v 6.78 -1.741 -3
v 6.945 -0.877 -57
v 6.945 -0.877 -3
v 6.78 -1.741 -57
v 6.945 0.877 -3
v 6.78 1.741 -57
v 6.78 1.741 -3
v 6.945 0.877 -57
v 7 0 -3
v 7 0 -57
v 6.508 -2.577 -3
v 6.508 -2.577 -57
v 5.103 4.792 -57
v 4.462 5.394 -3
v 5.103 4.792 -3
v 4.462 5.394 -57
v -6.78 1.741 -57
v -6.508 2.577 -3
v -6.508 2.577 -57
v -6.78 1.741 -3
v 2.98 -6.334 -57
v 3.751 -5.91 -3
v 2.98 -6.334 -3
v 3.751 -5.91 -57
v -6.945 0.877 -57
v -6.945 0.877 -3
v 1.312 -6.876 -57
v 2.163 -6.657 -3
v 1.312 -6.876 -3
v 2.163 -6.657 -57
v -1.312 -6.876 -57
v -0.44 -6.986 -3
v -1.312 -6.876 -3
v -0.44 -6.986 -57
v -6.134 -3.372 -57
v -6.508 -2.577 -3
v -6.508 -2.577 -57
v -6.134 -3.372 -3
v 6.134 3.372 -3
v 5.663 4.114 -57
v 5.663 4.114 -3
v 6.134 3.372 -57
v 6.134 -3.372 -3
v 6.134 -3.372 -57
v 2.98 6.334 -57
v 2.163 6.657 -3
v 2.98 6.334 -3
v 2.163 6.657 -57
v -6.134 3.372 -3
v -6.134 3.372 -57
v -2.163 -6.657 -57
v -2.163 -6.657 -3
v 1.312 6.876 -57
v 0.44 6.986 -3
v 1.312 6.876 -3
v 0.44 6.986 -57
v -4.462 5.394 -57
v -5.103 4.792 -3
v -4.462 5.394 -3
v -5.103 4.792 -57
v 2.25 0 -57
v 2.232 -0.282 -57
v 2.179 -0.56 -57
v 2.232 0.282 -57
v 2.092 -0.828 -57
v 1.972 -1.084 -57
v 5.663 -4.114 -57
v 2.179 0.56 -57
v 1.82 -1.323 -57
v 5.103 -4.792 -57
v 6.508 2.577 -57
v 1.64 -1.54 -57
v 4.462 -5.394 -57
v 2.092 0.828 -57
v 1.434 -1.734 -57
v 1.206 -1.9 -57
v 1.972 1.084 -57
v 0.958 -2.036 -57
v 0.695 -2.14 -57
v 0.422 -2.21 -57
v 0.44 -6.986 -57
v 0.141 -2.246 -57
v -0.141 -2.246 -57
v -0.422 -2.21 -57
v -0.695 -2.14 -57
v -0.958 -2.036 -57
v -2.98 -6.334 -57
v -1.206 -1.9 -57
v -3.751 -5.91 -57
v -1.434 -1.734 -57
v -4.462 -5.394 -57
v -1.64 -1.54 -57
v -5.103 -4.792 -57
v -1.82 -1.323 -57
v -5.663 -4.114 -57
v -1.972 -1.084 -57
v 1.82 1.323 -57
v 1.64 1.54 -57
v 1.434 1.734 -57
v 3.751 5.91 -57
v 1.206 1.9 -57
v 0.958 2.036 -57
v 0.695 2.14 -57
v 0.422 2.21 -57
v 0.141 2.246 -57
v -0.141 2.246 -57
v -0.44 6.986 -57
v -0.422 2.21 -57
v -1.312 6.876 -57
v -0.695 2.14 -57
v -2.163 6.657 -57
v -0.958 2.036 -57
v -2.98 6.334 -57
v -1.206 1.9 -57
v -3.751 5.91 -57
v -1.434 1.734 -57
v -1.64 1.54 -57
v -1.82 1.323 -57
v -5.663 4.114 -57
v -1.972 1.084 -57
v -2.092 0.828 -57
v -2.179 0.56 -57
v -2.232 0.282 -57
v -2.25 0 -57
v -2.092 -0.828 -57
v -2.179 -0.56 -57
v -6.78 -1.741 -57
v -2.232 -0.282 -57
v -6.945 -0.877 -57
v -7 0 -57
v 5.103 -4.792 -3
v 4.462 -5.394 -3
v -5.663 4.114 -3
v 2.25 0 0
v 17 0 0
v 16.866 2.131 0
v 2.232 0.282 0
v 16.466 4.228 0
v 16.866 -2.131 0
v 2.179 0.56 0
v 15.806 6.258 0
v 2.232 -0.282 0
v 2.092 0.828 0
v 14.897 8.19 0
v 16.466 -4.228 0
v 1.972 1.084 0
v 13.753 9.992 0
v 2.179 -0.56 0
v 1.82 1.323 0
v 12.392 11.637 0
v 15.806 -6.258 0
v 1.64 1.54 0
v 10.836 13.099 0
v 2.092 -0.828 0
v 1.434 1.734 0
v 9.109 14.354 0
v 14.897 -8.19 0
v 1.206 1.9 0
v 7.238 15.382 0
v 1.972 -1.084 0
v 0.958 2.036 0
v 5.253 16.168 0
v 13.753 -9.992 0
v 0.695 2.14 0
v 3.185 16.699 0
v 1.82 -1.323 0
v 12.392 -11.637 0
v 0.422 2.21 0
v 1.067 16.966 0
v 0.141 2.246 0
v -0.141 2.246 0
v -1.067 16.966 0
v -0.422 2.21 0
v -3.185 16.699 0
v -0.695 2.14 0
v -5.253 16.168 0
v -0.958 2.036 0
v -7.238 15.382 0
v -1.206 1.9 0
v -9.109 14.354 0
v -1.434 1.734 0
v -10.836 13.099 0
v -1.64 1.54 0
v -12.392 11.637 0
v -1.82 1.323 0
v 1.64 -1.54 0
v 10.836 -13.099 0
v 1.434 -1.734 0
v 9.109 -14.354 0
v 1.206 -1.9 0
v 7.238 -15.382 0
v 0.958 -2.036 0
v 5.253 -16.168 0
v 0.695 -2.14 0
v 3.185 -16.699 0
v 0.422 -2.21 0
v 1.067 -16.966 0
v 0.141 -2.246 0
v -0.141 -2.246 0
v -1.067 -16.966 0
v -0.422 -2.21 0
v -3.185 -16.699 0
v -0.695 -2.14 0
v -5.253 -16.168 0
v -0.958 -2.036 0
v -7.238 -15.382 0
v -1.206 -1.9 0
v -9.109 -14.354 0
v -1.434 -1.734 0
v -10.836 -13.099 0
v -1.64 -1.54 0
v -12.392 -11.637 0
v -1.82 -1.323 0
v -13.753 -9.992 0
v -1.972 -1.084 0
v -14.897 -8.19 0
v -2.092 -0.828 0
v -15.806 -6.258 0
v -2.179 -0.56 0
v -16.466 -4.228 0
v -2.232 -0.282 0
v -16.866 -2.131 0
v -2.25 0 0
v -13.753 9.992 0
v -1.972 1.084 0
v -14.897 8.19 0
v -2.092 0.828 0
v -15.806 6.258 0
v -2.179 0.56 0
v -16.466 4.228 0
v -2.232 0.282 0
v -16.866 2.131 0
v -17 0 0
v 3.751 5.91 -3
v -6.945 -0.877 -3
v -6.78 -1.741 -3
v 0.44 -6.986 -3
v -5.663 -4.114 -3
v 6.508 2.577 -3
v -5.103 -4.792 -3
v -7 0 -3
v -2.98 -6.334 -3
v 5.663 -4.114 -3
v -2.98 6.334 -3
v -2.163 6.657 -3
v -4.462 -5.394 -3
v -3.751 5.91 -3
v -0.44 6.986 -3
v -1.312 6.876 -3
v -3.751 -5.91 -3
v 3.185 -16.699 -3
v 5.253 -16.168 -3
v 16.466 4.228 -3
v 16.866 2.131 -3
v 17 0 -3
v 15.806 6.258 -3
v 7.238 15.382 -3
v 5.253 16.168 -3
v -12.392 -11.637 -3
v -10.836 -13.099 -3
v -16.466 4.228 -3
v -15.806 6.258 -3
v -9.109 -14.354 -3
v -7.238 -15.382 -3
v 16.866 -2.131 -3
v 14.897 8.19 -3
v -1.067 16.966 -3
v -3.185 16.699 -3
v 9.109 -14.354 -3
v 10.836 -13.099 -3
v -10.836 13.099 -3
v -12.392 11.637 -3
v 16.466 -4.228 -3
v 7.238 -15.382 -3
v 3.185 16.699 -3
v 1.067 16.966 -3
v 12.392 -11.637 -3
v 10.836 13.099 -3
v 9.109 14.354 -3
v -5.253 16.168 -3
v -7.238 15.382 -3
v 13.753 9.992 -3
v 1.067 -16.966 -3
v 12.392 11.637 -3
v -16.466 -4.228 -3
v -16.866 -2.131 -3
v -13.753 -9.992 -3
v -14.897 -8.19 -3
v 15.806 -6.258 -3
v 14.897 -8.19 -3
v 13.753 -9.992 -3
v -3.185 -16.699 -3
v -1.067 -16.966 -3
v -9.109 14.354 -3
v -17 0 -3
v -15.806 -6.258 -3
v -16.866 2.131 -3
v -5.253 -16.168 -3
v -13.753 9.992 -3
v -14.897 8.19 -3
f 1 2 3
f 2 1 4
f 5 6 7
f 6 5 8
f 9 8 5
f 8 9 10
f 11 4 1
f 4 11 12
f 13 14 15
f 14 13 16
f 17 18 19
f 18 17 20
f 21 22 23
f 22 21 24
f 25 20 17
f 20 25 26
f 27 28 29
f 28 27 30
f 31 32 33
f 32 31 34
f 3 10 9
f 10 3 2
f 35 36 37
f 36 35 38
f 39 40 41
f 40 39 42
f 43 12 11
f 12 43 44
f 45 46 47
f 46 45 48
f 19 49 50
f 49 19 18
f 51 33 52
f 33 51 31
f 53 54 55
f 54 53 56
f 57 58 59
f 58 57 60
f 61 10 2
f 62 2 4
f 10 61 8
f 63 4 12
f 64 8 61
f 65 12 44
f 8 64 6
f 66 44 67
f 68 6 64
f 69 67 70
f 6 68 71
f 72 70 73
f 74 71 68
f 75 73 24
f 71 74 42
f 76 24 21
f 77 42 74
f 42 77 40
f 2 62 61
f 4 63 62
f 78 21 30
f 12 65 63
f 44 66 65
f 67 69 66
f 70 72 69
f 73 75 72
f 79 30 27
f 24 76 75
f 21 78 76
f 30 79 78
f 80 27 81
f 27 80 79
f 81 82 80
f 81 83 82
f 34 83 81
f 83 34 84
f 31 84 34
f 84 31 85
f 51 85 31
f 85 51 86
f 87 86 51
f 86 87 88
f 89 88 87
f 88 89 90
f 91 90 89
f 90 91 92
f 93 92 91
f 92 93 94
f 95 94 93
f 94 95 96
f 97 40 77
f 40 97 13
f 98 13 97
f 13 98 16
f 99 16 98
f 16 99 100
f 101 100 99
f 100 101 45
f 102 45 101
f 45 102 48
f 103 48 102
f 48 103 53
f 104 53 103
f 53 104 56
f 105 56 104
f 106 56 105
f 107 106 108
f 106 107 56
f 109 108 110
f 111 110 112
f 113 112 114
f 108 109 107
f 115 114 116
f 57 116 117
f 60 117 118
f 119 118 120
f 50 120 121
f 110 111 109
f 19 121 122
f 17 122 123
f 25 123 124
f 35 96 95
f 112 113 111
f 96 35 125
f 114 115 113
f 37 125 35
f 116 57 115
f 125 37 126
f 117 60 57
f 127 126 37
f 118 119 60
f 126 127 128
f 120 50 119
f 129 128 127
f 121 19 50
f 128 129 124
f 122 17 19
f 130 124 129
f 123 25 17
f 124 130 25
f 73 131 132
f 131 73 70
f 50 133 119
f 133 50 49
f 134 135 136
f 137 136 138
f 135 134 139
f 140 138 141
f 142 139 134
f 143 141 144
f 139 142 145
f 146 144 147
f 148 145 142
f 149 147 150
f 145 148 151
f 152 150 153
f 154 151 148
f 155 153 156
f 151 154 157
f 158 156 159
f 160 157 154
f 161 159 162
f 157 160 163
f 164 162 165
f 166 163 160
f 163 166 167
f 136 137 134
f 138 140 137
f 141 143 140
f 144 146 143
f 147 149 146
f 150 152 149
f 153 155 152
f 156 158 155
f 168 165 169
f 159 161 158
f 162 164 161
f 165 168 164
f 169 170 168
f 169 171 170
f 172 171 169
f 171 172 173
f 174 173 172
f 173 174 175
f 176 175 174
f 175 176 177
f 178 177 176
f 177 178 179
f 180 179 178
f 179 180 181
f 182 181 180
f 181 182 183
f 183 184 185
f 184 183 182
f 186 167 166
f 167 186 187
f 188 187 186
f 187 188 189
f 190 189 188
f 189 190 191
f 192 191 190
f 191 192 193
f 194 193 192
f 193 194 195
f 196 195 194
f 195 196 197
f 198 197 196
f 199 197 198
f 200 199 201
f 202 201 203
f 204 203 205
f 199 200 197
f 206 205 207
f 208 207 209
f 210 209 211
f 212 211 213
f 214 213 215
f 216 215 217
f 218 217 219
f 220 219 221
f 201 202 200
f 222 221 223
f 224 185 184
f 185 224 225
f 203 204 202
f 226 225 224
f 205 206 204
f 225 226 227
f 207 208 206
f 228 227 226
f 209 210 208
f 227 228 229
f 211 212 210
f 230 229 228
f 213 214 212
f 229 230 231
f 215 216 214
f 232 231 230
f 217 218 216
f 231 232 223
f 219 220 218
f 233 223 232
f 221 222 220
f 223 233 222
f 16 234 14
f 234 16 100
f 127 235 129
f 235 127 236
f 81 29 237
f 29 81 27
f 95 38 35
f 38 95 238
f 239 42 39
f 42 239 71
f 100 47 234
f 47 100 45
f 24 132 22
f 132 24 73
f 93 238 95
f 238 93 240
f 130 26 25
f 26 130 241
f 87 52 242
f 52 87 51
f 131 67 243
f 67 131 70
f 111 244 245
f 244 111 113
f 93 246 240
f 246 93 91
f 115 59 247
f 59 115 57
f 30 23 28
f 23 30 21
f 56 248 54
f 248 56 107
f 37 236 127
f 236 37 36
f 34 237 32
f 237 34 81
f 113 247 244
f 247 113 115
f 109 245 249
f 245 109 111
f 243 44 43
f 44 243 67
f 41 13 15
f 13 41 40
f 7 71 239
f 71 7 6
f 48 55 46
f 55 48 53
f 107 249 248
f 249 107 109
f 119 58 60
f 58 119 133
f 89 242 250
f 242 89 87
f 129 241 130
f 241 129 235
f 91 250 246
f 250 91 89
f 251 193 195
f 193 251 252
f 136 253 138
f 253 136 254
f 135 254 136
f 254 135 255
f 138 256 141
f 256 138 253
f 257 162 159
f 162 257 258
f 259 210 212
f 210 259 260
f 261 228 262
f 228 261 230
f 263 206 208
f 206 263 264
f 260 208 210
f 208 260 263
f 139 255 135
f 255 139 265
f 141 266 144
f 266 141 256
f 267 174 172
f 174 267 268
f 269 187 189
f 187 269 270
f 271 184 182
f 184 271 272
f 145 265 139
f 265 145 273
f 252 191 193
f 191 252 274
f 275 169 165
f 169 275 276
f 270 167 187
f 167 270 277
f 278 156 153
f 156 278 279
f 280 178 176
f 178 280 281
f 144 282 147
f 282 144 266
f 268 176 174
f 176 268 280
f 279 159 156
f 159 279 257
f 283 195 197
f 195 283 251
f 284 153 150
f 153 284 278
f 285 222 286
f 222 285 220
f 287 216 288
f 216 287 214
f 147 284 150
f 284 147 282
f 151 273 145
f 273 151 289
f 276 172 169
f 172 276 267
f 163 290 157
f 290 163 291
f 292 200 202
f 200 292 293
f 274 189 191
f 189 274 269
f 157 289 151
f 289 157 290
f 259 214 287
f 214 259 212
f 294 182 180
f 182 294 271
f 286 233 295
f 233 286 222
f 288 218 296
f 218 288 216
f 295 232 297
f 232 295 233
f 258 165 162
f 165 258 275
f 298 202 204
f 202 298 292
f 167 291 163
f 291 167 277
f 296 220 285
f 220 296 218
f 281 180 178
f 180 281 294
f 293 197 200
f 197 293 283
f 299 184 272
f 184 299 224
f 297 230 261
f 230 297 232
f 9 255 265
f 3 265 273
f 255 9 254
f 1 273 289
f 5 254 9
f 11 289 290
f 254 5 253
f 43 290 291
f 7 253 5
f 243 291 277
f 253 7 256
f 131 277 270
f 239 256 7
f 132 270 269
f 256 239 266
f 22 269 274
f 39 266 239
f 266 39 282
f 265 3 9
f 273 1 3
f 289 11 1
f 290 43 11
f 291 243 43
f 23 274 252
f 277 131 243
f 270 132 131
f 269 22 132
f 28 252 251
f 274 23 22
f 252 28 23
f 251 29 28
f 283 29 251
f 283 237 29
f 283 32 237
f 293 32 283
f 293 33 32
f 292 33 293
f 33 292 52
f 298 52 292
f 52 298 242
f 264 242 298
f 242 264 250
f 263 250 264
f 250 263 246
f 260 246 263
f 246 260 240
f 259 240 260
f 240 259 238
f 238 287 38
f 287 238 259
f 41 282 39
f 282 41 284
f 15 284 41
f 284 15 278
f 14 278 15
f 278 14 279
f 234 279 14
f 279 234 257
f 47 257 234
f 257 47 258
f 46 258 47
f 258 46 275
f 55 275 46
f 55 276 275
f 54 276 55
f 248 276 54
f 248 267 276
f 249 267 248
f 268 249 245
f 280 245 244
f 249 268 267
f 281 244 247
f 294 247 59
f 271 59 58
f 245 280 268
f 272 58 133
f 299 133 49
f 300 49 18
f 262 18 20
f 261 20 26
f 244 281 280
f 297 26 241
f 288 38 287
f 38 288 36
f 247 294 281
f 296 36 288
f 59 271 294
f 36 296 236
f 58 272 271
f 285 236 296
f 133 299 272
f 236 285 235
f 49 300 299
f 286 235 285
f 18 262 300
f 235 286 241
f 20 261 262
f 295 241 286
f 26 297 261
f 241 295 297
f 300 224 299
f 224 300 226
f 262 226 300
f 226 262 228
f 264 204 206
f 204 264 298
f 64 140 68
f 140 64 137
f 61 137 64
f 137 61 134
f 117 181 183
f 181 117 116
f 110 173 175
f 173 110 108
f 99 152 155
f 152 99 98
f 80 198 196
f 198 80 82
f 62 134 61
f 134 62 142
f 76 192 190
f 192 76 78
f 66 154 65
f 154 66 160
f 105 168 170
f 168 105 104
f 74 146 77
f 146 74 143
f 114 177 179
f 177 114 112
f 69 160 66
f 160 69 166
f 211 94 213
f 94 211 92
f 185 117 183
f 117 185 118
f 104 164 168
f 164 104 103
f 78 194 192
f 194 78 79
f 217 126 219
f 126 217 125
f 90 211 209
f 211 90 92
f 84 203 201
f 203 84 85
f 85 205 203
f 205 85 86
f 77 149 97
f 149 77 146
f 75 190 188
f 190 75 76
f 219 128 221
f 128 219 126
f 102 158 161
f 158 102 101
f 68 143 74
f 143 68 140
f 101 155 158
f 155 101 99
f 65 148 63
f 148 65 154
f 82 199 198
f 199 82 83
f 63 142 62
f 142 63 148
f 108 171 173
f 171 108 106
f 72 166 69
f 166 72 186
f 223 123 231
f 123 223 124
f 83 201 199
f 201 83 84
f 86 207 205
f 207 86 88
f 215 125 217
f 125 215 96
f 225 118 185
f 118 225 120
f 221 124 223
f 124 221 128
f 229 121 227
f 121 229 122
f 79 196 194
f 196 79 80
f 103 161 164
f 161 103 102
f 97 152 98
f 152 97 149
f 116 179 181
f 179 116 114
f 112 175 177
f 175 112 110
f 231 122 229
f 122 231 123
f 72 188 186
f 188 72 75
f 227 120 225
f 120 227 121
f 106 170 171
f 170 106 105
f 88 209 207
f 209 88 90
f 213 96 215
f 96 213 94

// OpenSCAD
$fn = 50;


difference() {
	union() {
		translate(v = [0, 0, -57.0000000000]) {
			cylinder(h = 57, r = 7.0000000000);
		}
		translate(v = [0, 0, -3.0000000000]) {
			cylinder(h = 3, r = 17.0000000000);
		}
	}
	union() {
		#translate(v = [0, 0, -57]) {
			cylinder(h = 57, r = 2.2500000000);
		}
	}
}
